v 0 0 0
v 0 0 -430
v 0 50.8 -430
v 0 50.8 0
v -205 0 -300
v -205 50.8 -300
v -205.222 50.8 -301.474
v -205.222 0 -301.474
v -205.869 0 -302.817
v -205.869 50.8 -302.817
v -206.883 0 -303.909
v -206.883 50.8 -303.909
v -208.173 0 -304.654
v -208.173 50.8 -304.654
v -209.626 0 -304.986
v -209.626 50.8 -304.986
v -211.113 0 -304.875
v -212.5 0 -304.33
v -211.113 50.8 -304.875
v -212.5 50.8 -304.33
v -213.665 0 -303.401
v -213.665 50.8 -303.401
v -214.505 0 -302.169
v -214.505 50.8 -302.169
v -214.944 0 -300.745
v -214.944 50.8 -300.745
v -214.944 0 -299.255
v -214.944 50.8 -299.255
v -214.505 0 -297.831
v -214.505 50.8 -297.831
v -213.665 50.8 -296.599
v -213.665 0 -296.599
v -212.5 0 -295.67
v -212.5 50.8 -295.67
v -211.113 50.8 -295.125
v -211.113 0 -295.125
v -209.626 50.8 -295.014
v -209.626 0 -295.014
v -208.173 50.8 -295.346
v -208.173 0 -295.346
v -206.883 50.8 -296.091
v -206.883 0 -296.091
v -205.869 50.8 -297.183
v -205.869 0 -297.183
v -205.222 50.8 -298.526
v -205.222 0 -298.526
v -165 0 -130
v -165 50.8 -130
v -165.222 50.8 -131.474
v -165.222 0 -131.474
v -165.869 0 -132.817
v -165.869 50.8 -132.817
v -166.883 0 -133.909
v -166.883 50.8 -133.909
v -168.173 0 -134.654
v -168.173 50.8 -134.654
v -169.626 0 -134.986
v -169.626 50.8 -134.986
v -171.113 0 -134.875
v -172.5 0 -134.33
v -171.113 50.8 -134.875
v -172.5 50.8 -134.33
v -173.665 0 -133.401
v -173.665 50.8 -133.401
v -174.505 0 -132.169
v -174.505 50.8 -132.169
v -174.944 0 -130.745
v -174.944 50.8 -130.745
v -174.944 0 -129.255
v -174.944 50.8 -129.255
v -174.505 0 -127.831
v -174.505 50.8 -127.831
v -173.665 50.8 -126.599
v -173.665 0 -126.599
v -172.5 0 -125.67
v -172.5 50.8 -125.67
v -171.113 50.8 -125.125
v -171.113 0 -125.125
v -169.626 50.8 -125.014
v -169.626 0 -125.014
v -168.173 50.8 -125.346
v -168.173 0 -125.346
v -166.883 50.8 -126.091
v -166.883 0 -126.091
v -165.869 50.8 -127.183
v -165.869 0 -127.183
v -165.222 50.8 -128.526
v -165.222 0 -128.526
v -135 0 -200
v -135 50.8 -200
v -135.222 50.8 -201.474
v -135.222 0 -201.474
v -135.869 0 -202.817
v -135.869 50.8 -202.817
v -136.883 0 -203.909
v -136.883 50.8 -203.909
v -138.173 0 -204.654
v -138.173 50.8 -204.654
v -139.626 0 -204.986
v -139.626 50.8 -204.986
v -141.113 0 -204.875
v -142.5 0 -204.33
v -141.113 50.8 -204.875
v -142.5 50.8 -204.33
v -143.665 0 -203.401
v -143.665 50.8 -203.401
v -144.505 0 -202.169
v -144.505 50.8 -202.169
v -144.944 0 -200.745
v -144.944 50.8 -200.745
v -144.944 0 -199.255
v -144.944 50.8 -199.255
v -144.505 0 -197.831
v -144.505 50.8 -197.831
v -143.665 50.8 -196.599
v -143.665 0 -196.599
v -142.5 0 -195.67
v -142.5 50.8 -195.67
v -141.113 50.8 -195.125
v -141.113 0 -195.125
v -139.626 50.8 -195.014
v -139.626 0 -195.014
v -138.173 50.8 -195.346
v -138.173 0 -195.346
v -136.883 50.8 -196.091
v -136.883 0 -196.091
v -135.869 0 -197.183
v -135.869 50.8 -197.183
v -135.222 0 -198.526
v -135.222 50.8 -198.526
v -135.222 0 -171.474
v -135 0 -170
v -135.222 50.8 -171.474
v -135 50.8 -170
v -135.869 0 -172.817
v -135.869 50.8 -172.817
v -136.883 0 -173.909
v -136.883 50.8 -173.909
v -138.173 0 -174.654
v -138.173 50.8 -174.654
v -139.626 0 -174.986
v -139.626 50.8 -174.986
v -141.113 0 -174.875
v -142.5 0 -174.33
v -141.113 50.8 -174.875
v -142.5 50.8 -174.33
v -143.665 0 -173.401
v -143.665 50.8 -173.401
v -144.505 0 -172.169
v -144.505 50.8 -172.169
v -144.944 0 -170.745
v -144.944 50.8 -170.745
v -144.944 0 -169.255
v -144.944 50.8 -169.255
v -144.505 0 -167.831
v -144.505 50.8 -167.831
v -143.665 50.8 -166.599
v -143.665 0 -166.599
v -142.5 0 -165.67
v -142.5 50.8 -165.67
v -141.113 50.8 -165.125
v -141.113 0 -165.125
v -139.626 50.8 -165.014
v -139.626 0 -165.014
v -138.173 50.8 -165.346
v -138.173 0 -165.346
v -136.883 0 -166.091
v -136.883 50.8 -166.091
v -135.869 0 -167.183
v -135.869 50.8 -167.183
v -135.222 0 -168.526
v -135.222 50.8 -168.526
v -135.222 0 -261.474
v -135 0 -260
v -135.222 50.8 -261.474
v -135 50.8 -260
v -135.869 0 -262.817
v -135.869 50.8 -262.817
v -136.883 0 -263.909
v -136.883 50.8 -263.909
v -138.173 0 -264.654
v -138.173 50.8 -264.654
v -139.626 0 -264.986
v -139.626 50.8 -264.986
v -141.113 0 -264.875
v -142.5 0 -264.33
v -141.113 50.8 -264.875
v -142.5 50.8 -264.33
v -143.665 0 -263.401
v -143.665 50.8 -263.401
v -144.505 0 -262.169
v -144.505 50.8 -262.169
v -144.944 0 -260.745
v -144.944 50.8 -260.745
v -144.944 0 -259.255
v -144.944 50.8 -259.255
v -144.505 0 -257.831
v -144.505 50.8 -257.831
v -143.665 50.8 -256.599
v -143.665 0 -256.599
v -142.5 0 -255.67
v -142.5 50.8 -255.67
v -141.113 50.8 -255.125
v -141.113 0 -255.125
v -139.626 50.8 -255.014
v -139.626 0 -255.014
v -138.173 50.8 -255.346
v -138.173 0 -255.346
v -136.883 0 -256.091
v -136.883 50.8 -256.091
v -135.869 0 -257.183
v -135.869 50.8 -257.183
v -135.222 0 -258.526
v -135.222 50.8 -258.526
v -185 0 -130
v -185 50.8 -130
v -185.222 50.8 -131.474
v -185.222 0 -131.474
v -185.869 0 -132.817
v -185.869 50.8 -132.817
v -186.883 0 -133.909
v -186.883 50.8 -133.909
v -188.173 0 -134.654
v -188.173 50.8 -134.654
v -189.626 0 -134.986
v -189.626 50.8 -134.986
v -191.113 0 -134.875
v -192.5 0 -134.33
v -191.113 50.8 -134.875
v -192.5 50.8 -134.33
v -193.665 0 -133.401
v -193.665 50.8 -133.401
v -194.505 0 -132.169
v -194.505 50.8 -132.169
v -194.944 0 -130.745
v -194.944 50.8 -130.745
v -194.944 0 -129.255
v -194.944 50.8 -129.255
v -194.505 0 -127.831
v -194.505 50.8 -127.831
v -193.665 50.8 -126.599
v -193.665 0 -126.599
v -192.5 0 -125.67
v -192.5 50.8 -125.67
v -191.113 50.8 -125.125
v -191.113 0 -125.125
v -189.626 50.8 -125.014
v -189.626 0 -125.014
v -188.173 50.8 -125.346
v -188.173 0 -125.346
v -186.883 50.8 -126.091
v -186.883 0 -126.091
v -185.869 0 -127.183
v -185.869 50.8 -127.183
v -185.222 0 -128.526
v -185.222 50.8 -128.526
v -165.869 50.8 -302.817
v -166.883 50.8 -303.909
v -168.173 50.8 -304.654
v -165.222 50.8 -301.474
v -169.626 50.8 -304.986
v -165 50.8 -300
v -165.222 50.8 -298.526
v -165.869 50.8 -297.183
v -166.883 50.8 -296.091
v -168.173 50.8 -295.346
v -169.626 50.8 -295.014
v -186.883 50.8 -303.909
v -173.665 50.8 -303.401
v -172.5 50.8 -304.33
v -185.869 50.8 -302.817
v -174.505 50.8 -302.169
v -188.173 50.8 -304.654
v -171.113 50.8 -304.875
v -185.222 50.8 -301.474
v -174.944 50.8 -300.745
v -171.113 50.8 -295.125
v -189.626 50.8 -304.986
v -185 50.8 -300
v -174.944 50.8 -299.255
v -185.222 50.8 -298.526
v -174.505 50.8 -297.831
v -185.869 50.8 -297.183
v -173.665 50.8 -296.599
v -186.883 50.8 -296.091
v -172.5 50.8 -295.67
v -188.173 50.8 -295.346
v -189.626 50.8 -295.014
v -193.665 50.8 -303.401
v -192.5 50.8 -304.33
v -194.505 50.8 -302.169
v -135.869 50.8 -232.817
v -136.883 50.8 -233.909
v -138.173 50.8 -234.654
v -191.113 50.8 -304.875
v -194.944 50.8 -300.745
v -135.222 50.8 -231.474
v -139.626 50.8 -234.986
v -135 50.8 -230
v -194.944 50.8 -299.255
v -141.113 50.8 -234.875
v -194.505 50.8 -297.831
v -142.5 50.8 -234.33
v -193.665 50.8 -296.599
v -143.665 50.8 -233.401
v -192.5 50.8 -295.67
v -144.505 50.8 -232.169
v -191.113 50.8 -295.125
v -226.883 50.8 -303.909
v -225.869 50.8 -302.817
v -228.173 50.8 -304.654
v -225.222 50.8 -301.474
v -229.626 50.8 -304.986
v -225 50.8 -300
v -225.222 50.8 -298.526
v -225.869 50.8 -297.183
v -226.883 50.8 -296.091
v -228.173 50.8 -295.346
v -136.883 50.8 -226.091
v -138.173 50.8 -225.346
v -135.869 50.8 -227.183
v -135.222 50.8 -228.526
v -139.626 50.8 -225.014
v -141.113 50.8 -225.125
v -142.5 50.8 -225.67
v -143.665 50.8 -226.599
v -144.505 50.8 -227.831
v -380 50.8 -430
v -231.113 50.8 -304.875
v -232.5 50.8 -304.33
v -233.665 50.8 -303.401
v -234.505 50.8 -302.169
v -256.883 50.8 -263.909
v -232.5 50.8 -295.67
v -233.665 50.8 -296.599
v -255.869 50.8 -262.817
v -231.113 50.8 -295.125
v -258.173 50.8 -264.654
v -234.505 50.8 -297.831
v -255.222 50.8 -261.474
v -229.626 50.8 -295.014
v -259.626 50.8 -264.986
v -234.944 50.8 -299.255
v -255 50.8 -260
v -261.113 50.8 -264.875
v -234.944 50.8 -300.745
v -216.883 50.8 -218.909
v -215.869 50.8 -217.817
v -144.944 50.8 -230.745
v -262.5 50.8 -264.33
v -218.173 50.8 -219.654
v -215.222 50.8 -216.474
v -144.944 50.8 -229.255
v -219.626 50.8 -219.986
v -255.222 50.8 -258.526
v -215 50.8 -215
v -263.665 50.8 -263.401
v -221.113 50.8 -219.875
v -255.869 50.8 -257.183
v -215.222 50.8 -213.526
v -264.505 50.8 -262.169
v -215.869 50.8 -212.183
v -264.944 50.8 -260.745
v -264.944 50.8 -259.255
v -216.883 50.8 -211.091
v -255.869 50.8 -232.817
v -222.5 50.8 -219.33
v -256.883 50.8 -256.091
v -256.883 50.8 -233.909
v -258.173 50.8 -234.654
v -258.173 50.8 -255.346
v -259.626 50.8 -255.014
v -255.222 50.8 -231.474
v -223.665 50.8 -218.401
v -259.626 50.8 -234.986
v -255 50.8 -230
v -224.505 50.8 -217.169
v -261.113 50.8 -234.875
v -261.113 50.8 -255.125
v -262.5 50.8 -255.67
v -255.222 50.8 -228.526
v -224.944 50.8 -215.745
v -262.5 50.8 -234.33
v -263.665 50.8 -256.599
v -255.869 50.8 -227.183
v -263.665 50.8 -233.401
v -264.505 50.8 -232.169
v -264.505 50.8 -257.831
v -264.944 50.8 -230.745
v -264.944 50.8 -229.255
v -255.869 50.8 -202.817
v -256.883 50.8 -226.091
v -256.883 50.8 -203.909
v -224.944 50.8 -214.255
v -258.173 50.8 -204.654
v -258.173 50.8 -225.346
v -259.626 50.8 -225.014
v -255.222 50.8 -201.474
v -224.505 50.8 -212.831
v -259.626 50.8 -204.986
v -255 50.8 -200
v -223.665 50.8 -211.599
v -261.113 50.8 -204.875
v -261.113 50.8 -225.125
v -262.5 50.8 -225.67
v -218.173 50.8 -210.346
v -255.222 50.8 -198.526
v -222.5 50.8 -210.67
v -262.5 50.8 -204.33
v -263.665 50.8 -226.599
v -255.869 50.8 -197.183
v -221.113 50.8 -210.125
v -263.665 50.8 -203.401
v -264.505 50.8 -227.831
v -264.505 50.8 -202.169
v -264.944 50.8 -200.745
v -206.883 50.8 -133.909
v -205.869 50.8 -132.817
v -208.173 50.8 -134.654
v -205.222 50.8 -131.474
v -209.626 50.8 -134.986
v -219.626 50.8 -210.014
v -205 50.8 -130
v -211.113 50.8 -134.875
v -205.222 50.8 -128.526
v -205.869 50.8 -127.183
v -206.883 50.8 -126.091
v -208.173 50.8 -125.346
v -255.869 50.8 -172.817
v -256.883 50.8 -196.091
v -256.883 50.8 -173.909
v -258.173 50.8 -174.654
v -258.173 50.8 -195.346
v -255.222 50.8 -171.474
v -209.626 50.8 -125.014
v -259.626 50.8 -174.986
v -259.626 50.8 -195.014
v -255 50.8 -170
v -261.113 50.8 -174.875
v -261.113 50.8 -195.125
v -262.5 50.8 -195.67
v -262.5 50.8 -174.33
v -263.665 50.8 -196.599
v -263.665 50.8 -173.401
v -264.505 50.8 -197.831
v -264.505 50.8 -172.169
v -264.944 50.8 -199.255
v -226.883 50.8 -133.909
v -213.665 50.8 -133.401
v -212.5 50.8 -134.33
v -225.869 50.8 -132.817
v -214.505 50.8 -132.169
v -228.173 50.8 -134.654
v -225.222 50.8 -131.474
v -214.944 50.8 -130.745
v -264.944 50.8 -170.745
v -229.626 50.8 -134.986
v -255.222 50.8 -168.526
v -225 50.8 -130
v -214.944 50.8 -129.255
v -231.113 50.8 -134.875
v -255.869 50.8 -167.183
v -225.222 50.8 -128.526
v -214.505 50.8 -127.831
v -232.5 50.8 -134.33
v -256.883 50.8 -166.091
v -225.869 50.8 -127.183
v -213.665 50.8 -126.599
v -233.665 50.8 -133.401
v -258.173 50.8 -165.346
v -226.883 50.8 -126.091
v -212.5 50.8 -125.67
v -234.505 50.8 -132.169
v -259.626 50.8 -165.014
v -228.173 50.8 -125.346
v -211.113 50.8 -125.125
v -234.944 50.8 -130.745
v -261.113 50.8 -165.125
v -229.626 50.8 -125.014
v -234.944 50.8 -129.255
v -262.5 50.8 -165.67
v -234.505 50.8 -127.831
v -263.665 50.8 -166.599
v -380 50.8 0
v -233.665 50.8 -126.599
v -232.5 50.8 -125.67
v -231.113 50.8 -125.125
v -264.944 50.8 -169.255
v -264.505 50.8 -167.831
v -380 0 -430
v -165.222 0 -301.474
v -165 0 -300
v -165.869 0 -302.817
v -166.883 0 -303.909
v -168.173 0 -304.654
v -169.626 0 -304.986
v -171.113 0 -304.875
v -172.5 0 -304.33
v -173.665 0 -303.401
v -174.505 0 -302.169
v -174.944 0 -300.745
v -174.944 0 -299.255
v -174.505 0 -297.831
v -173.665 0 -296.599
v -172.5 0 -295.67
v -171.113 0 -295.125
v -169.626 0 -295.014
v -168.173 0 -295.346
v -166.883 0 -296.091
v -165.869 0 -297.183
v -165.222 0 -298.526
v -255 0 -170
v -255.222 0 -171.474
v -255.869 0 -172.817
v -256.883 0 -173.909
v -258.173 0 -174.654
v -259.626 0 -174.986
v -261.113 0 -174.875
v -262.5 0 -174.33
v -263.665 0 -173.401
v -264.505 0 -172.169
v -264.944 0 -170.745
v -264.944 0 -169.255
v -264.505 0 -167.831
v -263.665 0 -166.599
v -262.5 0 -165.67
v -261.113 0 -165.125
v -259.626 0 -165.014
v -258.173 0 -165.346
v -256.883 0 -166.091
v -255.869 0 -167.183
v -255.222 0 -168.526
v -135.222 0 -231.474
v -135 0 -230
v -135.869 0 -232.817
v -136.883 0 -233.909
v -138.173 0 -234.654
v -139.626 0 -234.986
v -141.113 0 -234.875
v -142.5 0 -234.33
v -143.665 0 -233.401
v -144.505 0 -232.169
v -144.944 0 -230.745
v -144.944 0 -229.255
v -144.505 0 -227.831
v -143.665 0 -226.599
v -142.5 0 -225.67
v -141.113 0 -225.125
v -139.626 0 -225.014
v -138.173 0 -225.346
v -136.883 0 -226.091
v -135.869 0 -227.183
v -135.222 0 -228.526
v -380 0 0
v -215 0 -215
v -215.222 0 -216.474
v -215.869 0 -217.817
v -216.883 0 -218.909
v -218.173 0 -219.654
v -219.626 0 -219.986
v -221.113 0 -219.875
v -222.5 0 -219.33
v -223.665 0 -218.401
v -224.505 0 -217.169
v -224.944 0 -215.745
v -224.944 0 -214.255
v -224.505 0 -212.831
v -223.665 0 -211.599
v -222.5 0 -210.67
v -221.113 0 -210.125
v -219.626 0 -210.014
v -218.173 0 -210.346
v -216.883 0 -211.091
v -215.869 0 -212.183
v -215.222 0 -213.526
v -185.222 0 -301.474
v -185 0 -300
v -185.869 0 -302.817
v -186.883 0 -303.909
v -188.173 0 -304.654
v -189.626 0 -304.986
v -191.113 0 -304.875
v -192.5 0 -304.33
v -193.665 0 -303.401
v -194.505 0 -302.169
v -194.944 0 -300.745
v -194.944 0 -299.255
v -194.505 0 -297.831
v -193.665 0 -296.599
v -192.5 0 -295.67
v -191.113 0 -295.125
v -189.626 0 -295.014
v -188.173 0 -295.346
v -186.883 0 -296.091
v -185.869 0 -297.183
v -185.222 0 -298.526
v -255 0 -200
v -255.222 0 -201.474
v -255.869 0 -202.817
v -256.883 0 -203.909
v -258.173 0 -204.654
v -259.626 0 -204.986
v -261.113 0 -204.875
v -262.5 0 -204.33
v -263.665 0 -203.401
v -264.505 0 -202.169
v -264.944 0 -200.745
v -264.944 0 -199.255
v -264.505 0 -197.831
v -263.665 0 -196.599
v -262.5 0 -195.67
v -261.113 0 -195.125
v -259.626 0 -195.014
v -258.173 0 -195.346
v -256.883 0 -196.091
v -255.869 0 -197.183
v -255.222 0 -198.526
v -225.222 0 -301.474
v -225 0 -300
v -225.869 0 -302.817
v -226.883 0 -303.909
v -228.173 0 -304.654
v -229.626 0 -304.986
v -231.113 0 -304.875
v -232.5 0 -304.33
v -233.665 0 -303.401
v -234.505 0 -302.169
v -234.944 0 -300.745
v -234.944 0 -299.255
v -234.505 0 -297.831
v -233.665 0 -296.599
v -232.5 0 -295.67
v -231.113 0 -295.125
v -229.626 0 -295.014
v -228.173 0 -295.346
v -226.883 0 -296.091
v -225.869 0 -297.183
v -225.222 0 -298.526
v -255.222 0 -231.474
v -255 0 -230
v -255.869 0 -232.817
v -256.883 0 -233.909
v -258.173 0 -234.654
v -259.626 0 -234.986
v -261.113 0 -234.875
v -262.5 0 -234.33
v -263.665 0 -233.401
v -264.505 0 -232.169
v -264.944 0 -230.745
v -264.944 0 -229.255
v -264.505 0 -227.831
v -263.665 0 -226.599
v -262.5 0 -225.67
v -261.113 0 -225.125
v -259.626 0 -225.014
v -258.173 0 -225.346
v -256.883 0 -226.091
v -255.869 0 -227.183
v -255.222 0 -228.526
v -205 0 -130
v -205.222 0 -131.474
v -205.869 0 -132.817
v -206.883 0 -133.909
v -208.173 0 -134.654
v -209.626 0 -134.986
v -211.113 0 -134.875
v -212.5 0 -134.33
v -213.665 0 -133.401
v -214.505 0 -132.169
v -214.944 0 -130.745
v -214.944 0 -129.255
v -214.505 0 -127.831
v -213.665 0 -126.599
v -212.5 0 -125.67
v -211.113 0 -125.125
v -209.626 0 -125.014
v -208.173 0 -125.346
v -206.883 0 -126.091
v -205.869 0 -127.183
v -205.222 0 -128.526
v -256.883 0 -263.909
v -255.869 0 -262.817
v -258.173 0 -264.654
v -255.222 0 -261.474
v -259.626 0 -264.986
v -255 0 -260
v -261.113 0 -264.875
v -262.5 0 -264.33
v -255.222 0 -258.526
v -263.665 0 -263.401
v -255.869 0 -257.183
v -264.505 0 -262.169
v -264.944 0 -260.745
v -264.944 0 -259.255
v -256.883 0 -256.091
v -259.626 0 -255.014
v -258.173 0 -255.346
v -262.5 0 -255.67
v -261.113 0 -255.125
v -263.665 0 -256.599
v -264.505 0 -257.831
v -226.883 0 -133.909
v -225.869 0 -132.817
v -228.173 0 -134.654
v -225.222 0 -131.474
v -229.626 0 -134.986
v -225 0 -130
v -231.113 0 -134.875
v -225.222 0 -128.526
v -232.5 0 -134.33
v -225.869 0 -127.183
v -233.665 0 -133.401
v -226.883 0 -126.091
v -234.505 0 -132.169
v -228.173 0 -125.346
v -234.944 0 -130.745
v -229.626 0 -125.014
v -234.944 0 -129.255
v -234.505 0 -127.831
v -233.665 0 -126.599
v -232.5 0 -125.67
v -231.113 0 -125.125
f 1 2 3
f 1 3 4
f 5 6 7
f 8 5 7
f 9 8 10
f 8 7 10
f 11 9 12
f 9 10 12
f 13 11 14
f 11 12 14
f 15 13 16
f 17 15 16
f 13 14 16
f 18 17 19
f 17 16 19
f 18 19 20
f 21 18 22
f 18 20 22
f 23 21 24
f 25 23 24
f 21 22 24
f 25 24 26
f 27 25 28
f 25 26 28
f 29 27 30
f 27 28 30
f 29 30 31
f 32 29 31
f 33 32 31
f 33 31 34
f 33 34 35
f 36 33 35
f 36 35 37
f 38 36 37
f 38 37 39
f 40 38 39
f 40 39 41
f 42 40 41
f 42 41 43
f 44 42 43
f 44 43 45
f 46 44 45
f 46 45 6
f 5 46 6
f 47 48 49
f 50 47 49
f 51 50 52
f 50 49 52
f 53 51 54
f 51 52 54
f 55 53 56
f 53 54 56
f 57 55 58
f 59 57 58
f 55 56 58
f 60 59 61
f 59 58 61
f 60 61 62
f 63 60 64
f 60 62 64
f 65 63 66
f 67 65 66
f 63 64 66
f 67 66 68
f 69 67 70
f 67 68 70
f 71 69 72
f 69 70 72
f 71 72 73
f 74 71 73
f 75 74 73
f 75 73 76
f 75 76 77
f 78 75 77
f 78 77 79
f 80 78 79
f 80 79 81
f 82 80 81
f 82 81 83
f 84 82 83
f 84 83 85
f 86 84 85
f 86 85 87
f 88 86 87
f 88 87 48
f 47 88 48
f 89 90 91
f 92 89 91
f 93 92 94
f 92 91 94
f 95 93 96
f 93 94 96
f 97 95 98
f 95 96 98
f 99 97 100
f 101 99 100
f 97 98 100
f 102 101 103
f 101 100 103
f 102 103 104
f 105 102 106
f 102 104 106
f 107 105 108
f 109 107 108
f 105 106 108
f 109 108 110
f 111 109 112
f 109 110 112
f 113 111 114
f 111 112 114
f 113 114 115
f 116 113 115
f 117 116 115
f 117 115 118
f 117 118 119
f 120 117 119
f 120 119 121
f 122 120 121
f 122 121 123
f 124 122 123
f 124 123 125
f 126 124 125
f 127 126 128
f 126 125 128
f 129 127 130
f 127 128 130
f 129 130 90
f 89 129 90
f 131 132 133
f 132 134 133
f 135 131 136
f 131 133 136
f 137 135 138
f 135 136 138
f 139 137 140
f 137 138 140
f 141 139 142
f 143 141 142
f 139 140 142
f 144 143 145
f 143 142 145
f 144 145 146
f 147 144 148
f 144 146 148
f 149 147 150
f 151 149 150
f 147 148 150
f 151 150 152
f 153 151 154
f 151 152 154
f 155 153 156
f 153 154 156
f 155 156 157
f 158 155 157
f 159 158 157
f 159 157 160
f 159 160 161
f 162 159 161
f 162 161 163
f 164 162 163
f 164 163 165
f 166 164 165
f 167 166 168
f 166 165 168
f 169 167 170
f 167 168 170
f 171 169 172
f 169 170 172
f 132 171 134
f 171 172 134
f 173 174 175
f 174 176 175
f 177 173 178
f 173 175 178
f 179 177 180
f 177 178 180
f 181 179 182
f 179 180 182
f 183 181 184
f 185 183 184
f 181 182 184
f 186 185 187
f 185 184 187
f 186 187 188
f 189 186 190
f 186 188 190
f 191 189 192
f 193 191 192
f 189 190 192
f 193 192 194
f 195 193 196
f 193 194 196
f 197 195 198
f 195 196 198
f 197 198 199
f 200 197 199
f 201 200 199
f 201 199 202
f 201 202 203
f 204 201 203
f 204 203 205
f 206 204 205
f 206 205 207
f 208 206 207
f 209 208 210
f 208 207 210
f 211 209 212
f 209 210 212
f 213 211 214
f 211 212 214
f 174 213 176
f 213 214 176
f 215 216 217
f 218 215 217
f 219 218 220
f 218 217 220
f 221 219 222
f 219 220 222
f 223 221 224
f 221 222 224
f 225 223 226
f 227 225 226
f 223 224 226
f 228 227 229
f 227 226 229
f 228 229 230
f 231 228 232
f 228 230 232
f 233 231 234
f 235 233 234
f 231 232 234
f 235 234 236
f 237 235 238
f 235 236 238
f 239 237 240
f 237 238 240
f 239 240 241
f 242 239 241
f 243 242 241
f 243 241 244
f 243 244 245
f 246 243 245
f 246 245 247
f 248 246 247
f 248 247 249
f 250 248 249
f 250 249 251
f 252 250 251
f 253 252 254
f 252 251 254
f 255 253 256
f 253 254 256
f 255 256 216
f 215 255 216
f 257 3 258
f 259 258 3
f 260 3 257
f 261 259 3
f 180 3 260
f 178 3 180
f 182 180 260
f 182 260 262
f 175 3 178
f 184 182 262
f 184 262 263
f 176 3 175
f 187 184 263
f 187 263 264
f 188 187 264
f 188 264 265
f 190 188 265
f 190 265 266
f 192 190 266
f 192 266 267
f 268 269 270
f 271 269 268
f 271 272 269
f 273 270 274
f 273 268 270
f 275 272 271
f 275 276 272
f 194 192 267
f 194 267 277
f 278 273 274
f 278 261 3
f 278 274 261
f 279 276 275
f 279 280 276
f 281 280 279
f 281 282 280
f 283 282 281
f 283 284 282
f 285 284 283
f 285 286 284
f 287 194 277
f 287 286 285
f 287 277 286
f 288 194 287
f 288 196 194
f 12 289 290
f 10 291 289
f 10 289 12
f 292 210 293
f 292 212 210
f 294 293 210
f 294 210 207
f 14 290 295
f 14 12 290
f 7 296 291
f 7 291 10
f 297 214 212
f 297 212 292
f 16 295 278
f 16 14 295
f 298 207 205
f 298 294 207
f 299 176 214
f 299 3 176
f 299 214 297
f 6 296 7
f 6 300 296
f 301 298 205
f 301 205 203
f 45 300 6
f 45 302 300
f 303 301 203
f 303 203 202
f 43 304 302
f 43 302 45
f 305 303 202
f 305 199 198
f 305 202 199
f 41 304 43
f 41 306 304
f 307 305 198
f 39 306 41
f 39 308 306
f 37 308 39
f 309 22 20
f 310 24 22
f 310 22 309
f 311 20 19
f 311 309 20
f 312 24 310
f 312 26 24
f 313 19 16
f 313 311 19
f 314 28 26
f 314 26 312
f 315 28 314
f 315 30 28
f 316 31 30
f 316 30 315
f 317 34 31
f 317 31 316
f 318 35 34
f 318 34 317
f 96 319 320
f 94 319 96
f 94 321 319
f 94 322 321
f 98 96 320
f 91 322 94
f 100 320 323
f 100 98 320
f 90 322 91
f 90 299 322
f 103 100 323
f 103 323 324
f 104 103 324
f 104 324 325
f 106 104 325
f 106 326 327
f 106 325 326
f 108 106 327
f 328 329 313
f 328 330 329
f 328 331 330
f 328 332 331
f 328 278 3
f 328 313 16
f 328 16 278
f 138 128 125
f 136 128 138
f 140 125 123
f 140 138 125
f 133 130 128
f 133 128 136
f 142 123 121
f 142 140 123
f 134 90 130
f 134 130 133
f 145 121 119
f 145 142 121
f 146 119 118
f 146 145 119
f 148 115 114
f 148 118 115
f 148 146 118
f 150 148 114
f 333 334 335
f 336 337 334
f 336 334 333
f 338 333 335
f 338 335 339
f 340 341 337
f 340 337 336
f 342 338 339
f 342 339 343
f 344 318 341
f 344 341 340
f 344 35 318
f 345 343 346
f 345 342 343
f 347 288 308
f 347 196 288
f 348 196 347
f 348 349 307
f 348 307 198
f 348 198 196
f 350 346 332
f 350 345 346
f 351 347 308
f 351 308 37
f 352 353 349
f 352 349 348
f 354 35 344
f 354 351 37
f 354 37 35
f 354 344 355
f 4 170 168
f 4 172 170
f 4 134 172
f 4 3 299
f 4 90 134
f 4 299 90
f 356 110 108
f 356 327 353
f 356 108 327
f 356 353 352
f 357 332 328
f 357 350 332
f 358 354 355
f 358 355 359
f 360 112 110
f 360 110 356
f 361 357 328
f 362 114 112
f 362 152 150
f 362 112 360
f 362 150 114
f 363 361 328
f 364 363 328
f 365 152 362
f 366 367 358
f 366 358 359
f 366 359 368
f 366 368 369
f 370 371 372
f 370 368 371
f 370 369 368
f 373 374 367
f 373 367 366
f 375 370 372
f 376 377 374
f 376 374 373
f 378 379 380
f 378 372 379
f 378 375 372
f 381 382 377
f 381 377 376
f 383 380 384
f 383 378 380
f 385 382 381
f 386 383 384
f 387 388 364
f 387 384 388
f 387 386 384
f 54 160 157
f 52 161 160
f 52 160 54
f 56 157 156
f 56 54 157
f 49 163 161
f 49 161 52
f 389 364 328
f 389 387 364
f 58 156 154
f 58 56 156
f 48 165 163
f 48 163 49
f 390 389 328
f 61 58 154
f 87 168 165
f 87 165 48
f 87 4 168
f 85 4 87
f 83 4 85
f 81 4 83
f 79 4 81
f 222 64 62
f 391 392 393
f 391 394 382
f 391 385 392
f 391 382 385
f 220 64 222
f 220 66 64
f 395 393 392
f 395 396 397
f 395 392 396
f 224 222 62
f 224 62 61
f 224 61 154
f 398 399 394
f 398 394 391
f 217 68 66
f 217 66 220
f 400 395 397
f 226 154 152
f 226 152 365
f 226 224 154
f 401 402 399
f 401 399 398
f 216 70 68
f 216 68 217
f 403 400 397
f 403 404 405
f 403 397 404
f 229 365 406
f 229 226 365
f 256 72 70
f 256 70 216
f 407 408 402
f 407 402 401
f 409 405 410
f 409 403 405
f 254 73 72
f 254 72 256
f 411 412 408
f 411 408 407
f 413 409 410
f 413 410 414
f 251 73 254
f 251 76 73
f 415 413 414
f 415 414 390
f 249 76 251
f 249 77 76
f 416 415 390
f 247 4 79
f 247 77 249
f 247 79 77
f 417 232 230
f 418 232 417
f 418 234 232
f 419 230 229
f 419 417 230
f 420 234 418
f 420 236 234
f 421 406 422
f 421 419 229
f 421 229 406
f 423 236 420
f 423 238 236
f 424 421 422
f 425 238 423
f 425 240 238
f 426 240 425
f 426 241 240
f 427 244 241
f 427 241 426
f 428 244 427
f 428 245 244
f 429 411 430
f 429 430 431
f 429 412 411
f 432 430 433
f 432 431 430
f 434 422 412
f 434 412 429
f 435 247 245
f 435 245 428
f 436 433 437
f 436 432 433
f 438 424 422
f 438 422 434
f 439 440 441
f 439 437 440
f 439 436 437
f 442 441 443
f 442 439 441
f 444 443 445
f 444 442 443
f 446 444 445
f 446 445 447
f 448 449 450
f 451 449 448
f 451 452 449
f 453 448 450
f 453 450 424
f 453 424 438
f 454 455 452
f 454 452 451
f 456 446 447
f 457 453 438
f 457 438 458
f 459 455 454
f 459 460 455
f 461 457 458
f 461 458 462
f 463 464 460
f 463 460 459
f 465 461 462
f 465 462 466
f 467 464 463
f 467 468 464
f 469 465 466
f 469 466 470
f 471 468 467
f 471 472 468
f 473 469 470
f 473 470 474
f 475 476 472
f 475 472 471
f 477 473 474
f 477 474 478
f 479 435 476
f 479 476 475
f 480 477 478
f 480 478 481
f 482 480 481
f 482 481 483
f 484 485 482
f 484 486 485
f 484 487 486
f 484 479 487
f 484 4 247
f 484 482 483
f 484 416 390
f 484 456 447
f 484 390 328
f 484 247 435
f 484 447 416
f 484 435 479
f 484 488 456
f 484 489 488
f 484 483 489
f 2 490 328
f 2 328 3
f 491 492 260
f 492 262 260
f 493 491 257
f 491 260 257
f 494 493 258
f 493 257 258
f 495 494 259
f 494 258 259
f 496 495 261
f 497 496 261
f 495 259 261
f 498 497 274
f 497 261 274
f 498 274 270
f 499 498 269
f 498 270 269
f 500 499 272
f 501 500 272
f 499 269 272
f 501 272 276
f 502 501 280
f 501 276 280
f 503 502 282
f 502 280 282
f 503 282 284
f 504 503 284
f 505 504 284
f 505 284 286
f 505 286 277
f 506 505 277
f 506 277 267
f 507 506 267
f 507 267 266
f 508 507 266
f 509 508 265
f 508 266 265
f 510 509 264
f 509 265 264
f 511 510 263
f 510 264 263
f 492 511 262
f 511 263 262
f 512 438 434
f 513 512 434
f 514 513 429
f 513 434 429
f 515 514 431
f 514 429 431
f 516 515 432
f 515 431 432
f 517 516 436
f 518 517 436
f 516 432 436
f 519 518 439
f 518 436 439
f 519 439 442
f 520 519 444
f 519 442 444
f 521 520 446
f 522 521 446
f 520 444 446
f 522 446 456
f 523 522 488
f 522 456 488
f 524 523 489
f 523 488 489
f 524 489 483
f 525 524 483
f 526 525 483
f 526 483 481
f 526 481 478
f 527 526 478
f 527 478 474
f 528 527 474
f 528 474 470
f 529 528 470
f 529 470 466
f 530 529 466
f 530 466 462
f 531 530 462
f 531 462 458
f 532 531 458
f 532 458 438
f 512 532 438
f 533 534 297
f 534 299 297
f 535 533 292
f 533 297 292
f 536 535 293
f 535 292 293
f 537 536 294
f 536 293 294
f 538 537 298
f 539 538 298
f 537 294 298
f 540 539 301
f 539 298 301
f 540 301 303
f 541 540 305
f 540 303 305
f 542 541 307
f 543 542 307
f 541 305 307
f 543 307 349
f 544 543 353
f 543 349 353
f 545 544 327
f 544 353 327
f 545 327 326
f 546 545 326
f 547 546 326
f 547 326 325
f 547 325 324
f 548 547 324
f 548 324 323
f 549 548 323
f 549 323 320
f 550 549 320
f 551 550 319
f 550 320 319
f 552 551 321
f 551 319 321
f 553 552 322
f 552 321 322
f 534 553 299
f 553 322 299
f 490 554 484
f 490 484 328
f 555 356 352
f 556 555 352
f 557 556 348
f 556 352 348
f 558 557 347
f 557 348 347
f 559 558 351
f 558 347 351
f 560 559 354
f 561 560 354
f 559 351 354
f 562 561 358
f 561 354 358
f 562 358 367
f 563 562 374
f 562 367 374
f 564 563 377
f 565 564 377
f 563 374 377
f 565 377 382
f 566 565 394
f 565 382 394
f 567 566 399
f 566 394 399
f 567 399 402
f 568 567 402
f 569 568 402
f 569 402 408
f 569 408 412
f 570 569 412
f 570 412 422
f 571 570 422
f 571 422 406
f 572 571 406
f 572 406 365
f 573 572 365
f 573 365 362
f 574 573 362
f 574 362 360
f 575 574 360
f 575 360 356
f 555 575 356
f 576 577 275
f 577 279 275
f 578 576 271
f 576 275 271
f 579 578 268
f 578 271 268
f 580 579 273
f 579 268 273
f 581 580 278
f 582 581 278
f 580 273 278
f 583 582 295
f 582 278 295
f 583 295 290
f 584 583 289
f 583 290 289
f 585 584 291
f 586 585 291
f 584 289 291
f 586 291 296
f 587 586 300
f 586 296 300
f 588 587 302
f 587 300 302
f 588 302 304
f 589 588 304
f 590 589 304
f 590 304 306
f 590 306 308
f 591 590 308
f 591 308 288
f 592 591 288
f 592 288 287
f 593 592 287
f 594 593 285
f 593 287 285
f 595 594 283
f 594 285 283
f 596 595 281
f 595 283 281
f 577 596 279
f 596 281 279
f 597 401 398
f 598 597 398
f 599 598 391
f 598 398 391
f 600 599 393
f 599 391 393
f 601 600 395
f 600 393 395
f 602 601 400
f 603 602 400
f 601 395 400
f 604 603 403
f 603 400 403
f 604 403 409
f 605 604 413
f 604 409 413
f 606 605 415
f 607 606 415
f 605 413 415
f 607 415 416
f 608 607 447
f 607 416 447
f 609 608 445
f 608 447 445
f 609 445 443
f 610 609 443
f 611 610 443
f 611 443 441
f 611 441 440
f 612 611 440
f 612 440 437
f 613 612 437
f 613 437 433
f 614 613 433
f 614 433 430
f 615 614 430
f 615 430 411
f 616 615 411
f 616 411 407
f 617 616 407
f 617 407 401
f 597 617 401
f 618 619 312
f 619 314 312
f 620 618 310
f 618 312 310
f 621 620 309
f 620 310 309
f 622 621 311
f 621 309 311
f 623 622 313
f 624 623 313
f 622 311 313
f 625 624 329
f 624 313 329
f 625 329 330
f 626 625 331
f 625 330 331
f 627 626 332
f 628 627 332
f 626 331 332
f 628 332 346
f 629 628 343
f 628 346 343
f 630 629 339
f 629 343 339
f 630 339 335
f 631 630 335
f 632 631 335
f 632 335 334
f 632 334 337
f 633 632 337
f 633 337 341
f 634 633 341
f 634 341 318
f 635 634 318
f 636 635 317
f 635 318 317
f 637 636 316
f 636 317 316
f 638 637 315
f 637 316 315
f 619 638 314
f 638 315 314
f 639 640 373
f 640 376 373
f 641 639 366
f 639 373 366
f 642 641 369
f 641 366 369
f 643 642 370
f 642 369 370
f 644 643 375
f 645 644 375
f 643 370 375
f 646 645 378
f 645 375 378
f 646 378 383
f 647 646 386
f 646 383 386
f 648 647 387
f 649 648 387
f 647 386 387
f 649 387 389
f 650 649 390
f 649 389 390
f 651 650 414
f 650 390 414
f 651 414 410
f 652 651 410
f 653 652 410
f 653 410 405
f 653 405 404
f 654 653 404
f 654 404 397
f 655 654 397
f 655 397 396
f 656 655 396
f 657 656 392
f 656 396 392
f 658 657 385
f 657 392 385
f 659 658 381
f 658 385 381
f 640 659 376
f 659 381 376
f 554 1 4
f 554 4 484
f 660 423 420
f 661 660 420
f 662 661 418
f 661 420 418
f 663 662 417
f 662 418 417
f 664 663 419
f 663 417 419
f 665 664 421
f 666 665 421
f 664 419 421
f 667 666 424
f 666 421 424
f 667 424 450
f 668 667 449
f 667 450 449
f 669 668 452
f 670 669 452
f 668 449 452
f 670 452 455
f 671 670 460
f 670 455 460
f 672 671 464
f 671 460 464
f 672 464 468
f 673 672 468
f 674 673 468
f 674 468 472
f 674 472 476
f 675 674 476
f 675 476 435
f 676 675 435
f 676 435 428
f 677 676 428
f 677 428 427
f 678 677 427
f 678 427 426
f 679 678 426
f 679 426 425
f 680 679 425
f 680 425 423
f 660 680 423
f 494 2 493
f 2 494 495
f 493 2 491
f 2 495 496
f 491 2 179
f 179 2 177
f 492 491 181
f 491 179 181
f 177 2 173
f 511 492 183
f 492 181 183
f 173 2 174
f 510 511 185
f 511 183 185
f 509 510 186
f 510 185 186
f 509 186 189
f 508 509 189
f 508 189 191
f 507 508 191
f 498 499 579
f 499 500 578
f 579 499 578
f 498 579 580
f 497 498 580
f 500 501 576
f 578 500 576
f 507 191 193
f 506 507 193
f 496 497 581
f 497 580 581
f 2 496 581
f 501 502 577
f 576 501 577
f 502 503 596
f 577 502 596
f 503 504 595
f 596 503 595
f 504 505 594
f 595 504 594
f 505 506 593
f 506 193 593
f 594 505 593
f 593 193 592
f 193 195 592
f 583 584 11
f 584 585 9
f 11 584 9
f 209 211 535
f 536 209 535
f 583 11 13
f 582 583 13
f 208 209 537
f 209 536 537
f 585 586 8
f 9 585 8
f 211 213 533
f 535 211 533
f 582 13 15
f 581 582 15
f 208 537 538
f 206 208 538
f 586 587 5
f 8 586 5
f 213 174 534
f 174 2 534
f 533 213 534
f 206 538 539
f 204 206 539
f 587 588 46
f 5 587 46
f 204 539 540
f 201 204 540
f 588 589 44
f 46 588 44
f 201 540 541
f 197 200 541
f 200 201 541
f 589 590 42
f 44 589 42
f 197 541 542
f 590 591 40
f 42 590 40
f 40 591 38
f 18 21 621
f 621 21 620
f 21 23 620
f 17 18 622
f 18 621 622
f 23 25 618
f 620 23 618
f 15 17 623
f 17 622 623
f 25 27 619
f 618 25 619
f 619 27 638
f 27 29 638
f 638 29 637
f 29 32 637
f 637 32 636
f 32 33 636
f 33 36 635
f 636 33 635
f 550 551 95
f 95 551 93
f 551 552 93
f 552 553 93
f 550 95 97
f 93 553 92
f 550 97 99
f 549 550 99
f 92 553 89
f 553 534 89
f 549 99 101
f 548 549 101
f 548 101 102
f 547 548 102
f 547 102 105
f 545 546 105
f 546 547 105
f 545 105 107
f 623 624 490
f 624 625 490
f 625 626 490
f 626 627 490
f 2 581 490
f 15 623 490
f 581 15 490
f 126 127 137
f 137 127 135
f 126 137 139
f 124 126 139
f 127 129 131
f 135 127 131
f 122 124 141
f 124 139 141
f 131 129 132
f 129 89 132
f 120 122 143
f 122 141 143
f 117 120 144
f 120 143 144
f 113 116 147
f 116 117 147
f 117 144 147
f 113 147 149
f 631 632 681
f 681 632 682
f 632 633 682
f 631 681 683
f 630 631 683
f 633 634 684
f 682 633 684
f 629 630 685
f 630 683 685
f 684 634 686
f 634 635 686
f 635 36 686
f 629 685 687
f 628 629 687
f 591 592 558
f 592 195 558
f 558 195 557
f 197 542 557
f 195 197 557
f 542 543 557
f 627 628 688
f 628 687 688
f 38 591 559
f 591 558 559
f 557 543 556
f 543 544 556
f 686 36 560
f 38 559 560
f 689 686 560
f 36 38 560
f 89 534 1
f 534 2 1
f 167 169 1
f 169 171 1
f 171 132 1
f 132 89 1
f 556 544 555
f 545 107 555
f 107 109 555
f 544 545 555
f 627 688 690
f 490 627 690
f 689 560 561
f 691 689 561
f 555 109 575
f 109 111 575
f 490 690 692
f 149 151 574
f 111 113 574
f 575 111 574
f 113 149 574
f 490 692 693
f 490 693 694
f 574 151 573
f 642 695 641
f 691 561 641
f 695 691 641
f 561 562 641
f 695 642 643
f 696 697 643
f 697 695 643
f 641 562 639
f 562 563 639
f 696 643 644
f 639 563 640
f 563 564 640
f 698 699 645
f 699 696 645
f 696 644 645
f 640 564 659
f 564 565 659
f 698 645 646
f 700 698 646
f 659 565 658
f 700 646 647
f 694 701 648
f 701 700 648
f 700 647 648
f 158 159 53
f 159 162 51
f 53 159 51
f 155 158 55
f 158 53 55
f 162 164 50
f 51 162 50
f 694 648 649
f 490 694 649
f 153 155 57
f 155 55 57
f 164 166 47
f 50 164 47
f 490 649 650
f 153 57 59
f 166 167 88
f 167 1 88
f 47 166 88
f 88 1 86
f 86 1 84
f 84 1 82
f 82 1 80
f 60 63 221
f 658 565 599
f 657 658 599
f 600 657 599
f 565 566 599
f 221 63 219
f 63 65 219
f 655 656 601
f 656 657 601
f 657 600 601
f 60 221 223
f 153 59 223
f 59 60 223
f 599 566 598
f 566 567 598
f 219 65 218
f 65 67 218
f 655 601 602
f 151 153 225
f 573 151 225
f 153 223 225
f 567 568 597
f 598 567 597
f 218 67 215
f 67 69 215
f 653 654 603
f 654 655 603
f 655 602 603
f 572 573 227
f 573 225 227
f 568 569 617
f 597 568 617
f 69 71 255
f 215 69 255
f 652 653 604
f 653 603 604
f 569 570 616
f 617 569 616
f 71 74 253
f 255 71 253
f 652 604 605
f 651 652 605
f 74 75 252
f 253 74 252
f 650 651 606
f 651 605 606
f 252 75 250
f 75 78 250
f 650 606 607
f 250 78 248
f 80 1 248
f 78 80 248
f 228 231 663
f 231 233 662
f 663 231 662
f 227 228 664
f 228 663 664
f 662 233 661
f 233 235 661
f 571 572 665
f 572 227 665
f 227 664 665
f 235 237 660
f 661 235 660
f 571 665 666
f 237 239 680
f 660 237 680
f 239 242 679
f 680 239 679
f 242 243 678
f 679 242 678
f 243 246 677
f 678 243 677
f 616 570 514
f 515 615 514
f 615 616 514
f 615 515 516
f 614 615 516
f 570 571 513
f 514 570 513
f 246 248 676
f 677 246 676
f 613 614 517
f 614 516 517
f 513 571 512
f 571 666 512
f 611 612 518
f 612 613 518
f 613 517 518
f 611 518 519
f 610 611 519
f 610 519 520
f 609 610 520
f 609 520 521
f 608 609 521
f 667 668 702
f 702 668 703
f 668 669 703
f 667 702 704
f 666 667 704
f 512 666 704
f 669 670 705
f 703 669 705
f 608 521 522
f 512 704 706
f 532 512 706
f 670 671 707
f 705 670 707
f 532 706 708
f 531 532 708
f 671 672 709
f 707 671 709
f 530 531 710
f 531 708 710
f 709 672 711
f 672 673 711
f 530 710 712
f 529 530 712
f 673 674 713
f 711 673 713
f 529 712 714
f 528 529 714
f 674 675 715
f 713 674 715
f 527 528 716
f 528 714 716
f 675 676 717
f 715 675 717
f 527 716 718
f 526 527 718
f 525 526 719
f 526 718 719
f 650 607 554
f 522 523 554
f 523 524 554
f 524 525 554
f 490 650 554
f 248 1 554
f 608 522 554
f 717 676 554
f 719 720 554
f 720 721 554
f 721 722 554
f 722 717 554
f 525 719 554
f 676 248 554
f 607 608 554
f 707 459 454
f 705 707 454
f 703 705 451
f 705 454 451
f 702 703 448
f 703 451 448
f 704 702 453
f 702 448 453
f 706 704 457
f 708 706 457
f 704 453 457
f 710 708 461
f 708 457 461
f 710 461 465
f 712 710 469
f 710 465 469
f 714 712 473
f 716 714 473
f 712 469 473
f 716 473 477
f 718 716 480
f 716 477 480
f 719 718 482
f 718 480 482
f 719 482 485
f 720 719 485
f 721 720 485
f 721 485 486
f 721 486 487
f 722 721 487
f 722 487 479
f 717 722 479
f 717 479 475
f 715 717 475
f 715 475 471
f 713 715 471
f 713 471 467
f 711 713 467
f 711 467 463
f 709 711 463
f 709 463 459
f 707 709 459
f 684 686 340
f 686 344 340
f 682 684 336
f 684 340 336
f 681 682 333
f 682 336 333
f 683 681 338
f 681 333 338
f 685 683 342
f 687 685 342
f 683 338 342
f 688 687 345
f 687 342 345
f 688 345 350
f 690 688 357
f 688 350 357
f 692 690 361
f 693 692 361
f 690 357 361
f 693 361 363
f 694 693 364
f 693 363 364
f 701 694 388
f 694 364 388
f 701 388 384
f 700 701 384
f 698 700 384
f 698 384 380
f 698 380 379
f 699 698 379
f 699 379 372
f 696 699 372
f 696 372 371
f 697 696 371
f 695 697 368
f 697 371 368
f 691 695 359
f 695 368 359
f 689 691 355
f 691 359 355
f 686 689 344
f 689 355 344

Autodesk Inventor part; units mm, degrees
ref_plane "YZ Plane" through (0, 0, 0) normal (1, 0, 0) x (0, 1, 0)
ref_plane "XZ Plane" through (0, 0, 0) normal (0, 1, 0) x (-1, 0, 0)
ref_plane "XY Plane" through (0, 0, 0) normal (0, 0, 1) x (1, 0, 0)
sketch "Sketch1" plane through (0, 0, 0) normal (0, 1, 0) x (-1, 0, 0)
  line L0 (0, 0) -> (380, 0)
  line L1 (380, 0) -> (380, -430)
  line L2 (380, -430) -> (0, -430)
  line L3 (0, -430) -> (0, 0)
  dimension "d0" = 380
  dimension "d1" = 430
extrude "Extrusion1" add sketch "Sketch1" along normal blind 50.8
sketch "Sketch2" plane through (0, 50.8, 0) normal (0, 1, 0) x (1, 0, 0)
  circle A0 centre (-220, 215) radius 5
  line L0 (0, 430) -> (-380, 430) projected
  line L1 (0, 0) -> (0, 430) projected
  line L2 (-380, 430) -> (-380, 0) projected
  dimension "d4" = 10
  dimension "d10" = 215
  dimension "d11" = 160
extrude "Extrusion2" cut sketch "Sketch2" against normal blind 50.8
sketch "Sketch3" plane through (0, 50.8, 0) normal (0, 1, 0) x (1, 0, 0)
  circle A0 centre (-170, 130) radius 5
  line L0 (0, 0) -> (0, 430) projected
  line L1 (-380, 0) -> (0, 0) projected
  circle A1 centre (-190, 130) radius 5
  circle A2 centre (-210, 130) radius 5
  circle A3 centre (-230, 130) radius 5
  dimension "d12" = 10
  dimension "d13" = 170
  dimension "d14" = 130
  dimension "d20" = 20
extrude "Extrusion3" cut sketch "Sketch3" against normal blind 50.8
sketch "Sketch4" plane through (0, 50.8, 0) normal (0, 1, 0) x (1, 0, 0)
  circle A0 centre (-170, 300) radius 5
  line L0 (0, 0) -> (0, 430) projected
  line L1 (0, 430) -> (-380, 430) projected
  circle A1 centre (-190, 300) radius 5
  circle A2 centre (-210, 300) radius 5
  circle A3 centre (-230, 300) radius 5
  dimension "d24" = 10
  dimension "d25" = 170
  dimension "d26" = 130
  dimension "d32" = 20
extrude "Extrusion4" cut sketch "Sketch4" against normal blind 50.8
sketch "Sketch5" plane through (0, 50.8, 0) normal (0, 1, 0) x (1, 0, 0)
  circle A0 centre (-260, 170) radius 5
  line L0 (-380, 430) -> (-380, 0) projected
  line L1 (-380, 0) -> (0, 0) projected
  circle A1 centre (-140, 170) radius 5
  line L2 (0, 0) -> (0, 430) projected
  circle A2 centre (-260, 200) radius 5
  circle A3 centre (-140, 200) radius 5
  circle A4 centre (-260, 230) radius 5
  circle A5 centre (-140, 230) radius 5
  circle A6 centre (-260, 260) radius 5
  circle A7 centre (-140, 260) radius 5
  dimension "d36" = 10
  dimension "d37" = 120
  dimension "d38" = 170
  dimension "d39" = 10
  dimension "d40" = 170
  dimension "d41" = 140
  dimension "d47" = 30
extrude "Extrusion5" cut sketch "Sketch5" against normal blind 50.8
properties part number "Trasera"
